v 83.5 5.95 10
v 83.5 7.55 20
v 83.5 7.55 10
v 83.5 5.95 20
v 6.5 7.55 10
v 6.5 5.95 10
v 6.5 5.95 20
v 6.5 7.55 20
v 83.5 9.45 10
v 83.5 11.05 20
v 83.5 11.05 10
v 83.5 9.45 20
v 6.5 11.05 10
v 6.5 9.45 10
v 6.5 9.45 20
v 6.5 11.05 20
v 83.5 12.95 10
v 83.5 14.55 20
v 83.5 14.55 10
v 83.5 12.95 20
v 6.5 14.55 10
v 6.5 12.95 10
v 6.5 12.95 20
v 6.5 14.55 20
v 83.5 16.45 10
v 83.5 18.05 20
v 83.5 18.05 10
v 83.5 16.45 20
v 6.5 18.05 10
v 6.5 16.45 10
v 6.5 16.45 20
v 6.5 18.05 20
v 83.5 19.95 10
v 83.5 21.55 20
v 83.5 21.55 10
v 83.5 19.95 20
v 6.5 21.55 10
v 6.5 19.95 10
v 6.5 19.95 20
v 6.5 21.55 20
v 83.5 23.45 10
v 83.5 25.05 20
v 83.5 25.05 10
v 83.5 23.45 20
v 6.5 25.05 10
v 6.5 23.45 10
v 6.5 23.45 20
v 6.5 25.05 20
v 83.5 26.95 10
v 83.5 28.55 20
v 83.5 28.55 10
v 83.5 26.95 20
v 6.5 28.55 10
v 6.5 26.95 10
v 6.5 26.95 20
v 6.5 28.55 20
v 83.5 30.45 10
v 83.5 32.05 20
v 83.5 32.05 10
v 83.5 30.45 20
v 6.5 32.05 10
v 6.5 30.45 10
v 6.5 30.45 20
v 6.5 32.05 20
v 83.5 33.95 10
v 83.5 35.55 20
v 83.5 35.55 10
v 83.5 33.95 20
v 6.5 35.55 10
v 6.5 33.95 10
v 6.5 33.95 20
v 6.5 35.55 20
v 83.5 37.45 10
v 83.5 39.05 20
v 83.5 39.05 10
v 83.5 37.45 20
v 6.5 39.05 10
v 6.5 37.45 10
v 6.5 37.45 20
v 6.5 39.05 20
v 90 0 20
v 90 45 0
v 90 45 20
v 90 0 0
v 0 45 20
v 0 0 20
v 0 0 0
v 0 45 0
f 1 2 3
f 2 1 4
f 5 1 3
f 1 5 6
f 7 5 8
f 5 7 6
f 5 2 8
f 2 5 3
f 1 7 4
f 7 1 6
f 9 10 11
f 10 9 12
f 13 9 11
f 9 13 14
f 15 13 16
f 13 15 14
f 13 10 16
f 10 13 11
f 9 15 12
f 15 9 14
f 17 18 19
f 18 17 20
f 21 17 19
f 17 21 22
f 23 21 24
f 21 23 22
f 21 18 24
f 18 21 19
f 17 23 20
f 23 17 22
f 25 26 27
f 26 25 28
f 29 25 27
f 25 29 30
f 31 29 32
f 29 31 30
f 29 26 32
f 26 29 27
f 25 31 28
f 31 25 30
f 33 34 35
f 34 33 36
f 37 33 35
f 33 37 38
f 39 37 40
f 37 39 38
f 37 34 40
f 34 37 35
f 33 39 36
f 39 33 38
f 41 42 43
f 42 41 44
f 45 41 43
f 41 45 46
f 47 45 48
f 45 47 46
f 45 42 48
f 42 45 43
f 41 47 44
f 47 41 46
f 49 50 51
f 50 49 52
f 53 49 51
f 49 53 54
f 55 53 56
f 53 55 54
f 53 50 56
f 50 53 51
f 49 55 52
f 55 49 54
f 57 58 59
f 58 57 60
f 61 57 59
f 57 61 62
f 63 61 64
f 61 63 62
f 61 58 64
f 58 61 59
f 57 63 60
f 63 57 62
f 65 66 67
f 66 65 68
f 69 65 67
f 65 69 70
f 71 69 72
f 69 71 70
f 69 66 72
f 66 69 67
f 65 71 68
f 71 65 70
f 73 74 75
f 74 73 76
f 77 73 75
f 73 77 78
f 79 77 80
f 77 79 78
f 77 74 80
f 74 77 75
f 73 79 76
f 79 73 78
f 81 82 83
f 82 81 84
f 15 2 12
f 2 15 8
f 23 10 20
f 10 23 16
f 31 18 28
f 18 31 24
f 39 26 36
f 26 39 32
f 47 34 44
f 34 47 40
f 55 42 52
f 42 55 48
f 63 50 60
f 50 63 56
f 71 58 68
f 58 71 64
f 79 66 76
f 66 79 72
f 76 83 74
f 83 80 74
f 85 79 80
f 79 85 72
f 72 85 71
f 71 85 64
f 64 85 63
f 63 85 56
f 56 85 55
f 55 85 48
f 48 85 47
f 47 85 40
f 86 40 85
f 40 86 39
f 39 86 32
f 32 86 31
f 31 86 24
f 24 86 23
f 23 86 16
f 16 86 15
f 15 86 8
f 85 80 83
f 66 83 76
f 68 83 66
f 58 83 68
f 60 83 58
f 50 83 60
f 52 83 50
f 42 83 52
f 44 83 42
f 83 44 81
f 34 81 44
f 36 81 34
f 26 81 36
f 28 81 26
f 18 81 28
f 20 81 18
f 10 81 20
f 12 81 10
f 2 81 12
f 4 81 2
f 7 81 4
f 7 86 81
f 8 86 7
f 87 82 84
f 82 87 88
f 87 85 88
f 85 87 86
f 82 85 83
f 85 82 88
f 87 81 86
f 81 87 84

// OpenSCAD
$fn = 64;

// Base dimensions (mm)
base_length = 90;   // X length (front to back)
base_width = 45;        // Y width (left to right)
base_height = 20;     // Z height (bottom to top)

// Slot dimensions (mm)
slot_length = 77;     // X length of slot (parallel to base length)
slot_width = 1.6;     // Y width of slot (center-to-center spacing is 3.5mm)
slot_depth = 10;      // Z depth of slot (from top surface)
slot_spacing = 3.5;     // Center-to-center spacing between slots (Y direction)
num_slots = 10;         // Number of slots

// Adjusted hole depth to extend 0.01mm beyond top surface (to avoid coplanar faces)
hole_depth = slot_depth + 0.01;

// Calculate total span of all slots (from left edge of first to right edge of last)
total_span = (num_slots - 1) * slot_spacing + slot_width;

// Calculate starting Y center for first slot (to center all slots on base)
first_slot_centre_y = (base_width - total_span) / 2 + slot_width / 2;

// Subtract slots from base (using for loop for 10 slots)
difference() {
    cube([base_length, base_width, base_height], center = false);
    
    for (i = [0 : num_slots - 1]) {
        // Calculate Y center for current slot
        slot_centre_y = first_slot_centre_y + i * slot_spacing;
        
        // Calculate slot position (X centered, Y centered, Z starting at base_height - slot_depth)
        start_x = (base_length - slot_length) / 2;
        start_y = slot_centre_y - slot_width / 2;
        start_z = base_height - slot_depth;  // 10mm below top surface (Z=20)

        // Create slot hole (extended 0.01mm beyond top surface)
        translate([start_x, start_y, start_z])
        cube([slot_length, slot_width, hole_depth]);
    }
}
